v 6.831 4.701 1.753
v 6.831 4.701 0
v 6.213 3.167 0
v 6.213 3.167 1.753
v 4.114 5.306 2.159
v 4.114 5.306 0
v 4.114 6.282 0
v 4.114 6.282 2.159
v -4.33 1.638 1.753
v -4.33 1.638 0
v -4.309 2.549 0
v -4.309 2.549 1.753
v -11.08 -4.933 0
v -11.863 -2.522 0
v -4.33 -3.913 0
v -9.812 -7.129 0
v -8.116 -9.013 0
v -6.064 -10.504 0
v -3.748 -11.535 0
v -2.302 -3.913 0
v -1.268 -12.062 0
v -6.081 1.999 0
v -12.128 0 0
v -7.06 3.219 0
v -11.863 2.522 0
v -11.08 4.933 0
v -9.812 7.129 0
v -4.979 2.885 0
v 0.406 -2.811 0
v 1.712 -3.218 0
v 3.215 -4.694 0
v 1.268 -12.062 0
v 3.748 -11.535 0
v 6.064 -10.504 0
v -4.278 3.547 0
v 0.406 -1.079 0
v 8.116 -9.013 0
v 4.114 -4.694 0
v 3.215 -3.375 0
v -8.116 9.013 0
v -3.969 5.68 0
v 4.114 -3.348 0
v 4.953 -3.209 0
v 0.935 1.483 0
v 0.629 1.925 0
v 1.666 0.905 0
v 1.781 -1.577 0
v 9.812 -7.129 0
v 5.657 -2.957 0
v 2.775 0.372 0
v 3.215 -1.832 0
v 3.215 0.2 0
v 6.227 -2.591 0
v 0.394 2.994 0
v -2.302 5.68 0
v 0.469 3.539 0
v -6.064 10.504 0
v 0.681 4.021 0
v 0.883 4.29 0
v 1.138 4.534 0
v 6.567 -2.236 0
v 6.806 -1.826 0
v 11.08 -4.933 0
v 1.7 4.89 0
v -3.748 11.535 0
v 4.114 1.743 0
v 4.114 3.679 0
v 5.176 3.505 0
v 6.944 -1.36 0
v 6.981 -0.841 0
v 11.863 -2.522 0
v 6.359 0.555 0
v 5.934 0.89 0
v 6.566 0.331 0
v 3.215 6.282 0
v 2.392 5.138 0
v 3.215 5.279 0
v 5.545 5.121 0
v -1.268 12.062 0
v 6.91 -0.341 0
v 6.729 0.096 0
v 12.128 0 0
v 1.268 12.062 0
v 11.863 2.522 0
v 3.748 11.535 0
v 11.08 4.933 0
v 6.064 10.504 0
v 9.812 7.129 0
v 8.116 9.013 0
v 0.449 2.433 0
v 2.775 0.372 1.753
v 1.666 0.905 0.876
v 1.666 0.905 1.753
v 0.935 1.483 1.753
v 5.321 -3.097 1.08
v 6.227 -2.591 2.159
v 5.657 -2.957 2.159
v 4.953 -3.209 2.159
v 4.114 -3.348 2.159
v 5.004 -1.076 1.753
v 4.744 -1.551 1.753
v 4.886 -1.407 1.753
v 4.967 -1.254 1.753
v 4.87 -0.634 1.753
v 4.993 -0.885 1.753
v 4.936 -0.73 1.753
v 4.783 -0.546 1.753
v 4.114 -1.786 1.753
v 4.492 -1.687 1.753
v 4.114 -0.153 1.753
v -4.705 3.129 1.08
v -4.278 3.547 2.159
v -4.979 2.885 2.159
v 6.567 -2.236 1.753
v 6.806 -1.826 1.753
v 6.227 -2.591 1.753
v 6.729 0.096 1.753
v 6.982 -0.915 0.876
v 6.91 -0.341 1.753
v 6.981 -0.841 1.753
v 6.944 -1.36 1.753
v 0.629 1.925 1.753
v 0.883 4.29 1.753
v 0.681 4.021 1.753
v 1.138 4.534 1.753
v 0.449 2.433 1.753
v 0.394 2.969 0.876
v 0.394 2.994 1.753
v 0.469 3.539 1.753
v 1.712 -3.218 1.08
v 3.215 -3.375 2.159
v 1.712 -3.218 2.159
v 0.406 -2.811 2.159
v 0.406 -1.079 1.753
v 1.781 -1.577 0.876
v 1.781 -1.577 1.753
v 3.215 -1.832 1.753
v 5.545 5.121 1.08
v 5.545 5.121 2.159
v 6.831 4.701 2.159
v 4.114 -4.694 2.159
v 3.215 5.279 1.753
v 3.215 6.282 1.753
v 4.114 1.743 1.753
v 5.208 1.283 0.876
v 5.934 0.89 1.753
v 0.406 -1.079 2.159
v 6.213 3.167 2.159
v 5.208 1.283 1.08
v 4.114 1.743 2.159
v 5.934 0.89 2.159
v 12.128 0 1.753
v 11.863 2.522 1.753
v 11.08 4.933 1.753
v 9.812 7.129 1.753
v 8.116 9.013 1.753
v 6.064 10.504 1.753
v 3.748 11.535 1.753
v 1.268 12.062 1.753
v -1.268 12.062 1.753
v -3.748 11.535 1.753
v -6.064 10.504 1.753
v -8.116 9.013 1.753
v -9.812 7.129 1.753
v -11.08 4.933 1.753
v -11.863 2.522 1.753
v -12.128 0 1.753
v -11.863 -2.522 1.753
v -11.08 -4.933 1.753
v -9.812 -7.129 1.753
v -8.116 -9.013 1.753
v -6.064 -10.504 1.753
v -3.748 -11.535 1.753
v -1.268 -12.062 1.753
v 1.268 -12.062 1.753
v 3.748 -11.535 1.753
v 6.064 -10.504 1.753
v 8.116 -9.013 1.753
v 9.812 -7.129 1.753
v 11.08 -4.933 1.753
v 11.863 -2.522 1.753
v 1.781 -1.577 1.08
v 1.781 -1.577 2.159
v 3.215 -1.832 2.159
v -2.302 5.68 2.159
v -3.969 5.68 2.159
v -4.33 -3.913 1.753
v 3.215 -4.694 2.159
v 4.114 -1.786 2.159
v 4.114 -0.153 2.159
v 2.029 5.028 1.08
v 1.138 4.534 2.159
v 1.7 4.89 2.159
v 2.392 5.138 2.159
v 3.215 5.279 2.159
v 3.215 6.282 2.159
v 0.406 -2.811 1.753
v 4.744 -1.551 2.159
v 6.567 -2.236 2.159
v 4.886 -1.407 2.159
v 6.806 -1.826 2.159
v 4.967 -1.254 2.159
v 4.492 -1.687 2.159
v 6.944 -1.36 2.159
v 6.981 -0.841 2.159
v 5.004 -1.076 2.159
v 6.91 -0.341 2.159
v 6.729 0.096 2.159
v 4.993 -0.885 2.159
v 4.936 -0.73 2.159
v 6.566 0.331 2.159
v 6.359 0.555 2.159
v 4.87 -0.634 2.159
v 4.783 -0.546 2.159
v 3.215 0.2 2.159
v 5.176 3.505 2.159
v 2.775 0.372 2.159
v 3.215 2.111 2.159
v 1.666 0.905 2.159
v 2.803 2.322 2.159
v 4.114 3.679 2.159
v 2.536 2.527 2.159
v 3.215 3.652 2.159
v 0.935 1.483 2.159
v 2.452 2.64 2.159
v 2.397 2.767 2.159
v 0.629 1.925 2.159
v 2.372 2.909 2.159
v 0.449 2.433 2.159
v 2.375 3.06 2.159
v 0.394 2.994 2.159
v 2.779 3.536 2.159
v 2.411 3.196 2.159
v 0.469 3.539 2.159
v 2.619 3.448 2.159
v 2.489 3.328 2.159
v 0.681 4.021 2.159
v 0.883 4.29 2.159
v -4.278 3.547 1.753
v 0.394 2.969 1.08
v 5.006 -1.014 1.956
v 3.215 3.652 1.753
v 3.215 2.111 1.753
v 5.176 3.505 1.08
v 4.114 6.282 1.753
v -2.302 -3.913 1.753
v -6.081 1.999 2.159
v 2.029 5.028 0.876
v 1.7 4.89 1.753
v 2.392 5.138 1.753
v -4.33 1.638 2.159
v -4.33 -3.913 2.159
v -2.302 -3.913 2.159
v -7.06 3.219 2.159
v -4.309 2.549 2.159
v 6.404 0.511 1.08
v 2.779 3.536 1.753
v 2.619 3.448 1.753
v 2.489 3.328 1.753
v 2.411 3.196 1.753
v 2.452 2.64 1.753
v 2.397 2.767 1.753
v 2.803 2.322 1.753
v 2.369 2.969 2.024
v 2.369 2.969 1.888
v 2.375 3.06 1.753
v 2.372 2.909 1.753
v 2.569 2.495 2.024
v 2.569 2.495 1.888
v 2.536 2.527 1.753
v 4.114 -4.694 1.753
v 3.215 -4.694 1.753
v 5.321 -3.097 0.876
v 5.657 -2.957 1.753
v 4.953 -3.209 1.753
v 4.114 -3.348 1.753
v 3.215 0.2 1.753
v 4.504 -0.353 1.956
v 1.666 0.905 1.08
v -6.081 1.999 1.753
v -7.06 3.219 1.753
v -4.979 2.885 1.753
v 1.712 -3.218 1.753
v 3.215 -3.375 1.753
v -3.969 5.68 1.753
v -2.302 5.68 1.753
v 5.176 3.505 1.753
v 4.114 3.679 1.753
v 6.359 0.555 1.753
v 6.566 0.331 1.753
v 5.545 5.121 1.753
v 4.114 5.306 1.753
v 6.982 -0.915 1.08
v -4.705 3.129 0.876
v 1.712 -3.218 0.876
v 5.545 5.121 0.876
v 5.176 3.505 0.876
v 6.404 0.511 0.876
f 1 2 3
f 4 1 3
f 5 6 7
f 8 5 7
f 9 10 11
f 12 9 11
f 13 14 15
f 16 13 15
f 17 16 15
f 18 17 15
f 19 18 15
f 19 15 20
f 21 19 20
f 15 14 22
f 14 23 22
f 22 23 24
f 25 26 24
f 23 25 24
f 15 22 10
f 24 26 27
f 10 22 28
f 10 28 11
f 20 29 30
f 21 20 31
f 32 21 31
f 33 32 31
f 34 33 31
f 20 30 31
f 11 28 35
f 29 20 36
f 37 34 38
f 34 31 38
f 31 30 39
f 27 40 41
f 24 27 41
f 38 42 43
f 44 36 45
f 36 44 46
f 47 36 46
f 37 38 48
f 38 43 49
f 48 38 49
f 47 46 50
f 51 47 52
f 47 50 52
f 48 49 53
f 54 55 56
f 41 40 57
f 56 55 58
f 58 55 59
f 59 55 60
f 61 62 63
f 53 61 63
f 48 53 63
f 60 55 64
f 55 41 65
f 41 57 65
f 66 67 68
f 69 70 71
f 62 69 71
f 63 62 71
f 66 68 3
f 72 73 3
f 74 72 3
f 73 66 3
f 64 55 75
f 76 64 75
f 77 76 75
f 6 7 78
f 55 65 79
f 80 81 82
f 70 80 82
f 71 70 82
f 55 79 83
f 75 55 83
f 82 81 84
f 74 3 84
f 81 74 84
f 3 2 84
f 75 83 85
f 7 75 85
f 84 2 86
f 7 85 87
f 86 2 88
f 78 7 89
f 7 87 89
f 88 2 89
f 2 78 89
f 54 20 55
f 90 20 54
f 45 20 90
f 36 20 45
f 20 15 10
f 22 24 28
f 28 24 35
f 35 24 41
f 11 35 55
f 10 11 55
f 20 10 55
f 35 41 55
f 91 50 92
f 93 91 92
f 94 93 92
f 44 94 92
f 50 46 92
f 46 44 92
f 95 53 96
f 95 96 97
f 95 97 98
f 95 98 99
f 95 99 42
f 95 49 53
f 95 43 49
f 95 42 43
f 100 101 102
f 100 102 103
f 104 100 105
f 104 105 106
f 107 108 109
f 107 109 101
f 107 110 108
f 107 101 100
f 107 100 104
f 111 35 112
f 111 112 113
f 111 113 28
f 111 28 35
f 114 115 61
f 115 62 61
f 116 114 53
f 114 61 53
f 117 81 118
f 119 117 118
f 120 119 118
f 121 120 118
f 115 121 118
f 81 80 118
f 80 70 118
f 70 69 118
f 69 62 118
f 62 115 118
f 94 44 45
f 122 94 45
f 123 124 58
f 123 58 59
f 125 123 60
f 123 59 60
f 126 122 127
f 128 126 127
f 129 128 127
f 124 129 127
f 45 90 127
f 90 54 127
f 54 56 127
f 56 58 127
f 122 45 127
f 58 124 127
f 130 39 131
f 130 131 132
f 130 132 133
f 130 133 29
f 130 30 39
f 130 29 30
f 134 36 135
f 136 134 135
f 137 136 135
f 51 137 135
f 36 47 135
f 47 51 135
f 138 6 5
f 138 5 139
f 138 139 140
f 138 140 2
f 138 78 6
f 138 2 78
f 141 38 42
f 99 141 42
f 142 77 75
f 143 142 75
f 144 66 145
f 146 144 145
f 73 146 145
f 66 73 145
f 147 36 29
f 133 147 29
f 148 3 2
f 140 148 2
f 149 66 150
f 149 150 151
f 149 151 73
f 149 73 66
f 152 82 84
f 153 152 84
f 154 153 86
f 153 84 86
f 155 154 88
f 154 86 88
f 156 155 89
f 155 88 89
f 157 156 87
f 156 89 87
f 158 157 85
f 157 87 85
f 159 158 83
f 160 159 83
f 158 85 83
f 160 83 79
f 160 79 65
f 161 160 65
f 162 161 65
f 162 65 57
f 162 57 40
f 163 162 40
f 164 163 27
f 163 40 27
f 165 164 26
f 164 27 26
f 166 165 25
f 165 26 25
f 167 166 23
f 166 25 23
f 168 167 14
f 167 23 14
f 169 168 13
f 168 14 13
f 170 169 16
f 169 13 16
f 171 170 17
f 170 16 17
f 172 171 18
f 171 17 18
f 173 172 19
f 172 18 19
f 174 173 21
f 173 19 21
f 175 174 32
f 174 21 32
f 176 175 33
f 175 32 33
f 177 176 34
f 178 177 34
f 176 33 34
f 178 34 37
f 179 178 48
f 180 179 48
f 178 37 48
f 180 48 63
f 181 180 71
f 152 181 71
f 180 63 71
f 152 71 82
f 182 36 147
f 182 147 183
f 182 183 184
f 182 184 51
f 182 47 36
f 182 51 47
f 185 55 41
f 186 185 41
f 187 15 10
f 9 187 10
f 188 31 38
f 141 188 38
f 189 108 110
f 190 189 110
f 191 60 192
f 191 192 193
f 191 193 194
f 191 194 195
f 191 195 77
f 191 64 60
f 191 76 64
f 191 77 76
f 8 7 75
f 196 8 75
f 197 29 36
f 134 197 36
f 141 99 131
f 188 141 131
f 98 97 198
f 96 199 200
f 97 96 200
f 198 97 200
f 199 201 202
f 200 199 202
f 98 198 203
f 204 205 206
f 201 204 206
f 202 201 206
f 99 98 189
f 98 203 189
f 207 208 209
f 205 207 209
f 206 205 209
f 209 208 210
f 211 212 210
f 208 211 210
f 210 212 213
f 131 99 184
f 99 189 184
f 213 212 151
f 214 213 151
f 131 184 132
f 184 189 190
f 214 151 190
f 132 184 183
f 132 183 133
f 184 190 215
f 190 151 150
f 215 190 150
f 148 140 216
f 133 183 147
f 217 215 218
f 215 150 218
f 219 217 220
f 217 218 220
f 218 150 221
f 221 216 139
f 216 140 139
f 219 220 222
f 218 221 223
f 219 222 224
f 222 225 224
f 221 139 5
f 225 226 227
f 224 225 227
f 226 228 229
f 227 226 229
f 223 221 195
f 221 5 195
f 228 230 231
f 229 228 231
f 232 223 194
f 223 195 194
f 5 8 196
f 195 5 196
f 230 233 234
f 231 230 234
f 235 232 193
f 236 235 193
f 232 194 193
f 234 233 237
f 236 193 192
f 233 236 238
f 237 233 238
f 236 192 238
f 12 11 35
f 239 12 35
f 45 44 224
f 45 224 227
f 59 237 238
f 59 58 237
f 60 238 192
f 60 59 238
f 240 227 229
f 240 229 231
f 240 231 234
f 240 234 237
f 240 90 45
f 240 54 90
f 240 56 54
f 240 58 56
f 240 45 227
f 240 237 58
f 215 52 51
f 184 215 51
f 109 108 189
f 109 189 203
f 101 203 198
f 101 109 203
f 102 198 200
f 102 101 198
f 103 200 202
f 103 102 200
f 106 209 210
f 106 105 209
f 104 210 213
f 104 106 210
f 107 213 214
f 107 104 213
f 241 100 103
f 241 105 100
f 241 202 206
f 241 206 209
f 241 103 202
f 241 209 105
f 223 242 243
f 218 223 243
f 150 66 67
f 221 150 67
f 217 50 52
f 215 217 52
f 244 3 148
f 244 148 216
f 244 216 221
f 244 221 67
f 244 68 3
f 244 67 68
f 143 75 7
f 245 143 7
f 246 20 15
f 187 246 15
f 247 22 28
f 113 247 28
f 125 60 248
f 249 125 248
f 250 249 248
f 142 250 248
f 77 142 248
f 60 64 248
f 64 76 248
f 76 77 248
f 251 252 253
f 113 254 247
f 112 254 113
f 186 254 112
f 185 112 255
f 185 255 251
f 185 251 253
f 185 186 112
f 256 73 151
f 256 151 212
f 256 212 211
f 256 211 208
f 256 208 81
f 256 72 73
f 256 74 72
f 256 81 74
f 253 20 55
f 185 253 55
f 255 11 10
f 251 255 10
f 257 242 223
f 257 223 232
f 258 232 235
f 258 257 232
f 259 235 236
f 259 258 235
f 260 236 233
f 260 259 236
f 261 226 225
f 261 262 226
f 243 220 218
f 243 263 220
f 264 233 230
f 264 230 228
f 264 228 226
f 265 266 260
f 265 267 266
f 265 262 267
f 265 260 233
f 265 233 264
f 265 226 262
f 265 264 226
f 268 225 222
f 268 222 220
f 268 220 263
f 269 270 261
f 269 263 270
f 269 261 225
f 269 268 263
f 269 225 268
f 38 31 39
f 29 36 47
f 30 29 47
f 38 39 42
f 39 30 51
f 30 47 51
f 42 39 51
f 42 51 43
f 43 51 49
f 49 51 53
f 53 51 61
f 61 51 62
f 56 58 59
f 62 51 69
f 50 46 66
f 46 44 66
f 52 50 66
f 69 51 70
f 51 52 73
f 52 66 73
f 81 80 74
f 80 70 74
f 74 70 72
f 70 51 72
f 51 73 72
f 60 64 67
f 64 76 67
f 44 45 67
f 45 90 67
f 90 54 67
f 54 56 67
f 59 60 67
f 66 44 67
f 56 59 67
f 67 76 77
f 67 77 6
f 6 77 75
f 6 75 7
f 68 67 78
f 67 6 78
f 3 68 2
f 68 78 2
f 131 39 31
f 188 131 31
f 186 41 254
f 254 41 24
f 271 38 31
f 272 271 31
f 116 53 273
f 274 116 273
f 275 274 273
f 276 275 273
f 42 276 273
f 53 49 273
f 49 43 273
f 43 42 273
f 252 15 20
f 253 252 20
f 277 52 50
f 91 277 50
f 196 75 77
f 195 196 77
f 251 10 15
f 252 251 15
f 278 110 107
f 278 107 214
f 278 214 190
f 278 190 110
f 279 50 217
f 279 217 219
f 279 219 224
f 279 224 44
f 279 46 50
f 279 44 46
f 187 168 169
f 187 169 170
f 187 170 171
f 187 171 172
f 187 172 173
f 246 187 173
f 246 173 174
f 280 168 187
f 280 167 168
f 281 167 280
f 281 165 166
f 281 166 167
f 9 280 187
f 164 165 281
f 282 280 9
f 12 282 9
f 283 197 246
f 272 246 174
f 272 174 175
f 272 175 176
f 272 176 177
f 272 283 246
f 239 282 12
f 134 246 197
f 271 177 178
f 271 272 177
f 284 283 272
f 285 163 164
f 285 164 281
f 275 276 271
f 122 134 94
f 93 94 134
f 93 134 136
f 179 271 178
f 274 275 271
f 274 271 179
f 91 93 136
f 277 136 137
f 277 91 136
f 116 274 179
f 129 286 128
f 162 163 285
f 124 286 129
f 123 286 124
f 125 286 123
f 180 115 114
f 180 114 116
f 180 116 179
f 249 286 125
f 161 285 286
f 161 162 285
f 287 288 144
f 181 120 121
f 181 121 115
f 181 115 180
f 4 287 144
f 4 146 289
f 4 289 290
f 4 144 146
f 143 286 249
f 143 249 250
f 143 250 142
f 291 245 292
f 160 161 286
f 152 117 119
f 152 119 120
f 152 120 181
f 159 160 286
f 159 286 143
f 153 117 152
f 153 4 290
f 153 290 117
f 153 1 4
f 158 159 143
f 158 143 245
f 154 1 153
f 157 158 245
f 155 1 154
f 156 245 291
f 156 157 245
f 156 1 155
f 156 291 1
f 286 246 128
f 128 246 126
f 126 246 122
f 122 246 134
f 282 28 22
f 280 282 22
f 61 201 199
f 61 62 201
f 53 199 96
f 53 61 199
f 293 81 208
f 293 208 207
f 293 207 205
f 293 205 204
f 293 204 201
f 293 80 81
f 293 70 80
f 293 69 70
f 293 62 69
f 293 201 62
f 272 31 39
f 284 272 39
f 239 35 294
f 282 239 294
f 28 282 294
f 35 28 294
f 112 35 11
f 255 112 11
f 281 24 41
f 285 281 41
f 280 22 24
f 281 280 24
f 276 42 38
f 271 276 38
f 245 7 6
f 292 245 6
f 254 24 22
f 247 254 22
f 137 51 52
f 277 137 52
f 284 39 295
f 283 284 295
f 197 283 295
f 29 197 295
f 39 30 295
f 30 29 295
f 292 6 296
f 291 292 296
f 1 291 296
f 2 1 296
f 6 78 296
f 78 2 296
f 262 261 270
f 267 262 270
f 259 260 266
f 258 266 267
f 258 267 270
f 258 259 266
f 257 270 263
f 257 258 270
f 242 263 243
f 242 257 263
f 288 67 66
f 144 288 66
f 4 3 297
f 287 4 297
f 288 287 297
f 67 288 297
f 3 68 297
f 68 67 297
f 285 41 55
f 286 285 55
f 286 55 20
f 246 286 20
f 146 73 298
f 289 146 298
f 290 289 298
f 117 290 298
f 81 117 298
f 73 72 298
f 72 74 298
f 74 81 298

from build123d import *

# Parameters (mm, degrees)
F1_DEPTH = 2.159
F2_DEPTH = 2.159
F3_DEPTH = 1.7526
F4_DEPTH = 1.7526
F0_R     = 12.1285
F5_DEPTH = 1.7526


with BuildPart() as f1:
    # F0 (on Top) → F1 (new body)
    with BuildSketch(Plane.XY):
        with BuildLine():
            Line((-4.3302370993, -3.9129708894), (-2.3021115051, -3.9129708894))
            Line((-2.3021115051, -3.9129708894), (-2.3021115051, 5.6796852593))
            Line((-2.3021115051, 5.6796852593), (-3.969121569, 5.6796852593))
            Line((-3.969121569, 5.6796852593), (-7.0595986649, 3.2190608324))
            Line((-7.0595986649, 3.2190608324), (-6.081227519, 1.9992461635))
            Line((-6.081227519, 1.9992461635), (-4.9789853483, 2.8852389179))
            add(Edge.make_bspline(
                [(-4.2777493768, 3.5465842203), (-4.781631512, 3.0427020851), (-4.9789853483, 2.8852389179)],
                knots=[0, 0, 0, 1, 1, 1], degree=2))
            Line((-4.2777493768, 3.5465842203), (-4.3092420103, 2.5493174944))
            Line((-4.3092420103, 2.5493174944), (-4.3302370993, 1.6381306333))
            Line((-4.3302370993, 1.6381306333), (-4.3302370993, -3.9129708894))
        make_face()
    extrude(amount=F1_DEPTH)


with BuildPart() as f2:
    # F0 (on Top) → F2 (new body)
    with BuildSketch(Plane.XY):
        with BuildLine():
            add(Edge.make_bspline(
                [(6.9819168357, -0.914872185), (6.9819168357, -1.9583281066), (6.2271433874, -2.5913300389)],
                knots=[0, 0, 0, 1, 1, 1], degree=2))
            add(Edge.make_bspline(
                [(6.7289260136, 0.0960413487), (6.9819168357, -0.3375072384), (6.9819168357, -0.914872185)],
                knots=[0, 0, 0, 1, 1, 1], degree=2))
            add(Edge.make_bspline(
                [(5.9342618963, 0.8896557116), (6.4759351916, 0.5295899359), (6.7289260136, 0.0960413487)],
                knots=[0, 0, 0, 1, 1, 1], degree=2))
            add(Edge.make_bspline(
                [(4.1139876829, 1.7431060781), (5.3925886009, 1.2497214874), (5.9342618963, 0.8896557116)],
                knots=[0, 0, 0, 1, 1, 1], degree=2))
            Line((4.1139876829, 1.7431060781), (4.1139876829, 3.6788532808))
            add(Edge.make_bspline(
                [(6.2134965795, 3.16657311), (5.188936238, 3.5864748893), (4.1139876829, 3.6788532808)],
                knots=[0, 0, 0, 1, 1, 1], degree=2))
            Line((6.2134965795, 3.16657311), (6.8307521951, 4.7013141134))
            add(Edge.make_bspline(
                [(4.1139876829, 5.3059726757), (5.6172360529, 5.238788391), (6.8307521951, 4.7013141134)],
                knots=[0, 0, 0, 1, 1, 1], degree=2))
            Line((4.1139876829, 5.3059726757), (4.1139876829, 6.2822443126))
            Line((4.1139876829, 6.2822443126), (3.2153978752, 6.2822443126))
            Line((3.2153978752, 6.2822443126), (3.2153978752, 5.27867906))
            add(Edge.make_bspline(
                [(1.137933822, 4.5344031562), (1.8822097258, 5.1485095084), (3.2153978752, 5.27867906)],
                knots=[0, 0, 0, 1, 1, 1], degree=2))
            add(Edge.make_bspline(
                [(0.3936579181, 2.9692192737), (0.3936579181, 3.9202968039), (1.137933822, 4.5344031562)],
                knots=[0, 0, 0, 1, 1, 1], degree=2))
            add(Edge.make_bspline(
                [(0.9353312134, 1.4827669749), (0.3936579181, 2.0832265194), (0.3936579181, 2.9692192737)],
                knots=[0, 0, 0, 1, 1, 1], degree=2))
            add(Edge.make_bspline(
                [(2.7745010069, 0.3721267686), (1.4770045088, 0.8823074305), (0.9353312134, 1.4827669749)],
                knots=[0, 0, 0, 1, 1, 1], degree=2))
            Line((2.7745010069, 0.3721267686), (3.2153978752, 0.1999670391))
            Line((3.2153978752, 0.1999670391), (3.2153978752, -1.8323575728))
            add(Edge.make_bspline(
                [(1.7814332988, -1.5772672419), (2.5855452062, -1.7945664127), (3.2153978752, -1.8323575728)],
                knots=[0, 0, 0, 1, 1, 1], degree=2))
            add(Edge.make_bspline(
                [(0.4062549715, -1.0786338789), (0.9773213914, -1.3599680711), (1.7814332988, -1.5772672419)],
                knots=[0, 0, 0, 1, 1, 1], degree=2))
            Line((0.4062549715, -1.0786338789), (0.4062549715, -2.8107287186))
            add(Edge.make_bspline(
                [(3.2153978752, -3.3754966118), (1.613472587, -3.3419044695), (0.4062549715, -2.8107287186)],
                knots=[0, 0, 0, 1, 1, 1], degree=2))
            Line((3.2153978752, -3.3754966118), (3.2153978752, -4.6939881989))
            Line((3.2153978752, -4.6939881989), (4.1139876829, -4.6939881989))
            Line((4.1139876829, -4.6939881989), (4.1139876829, -3.3482029962))
            add(Edge.make_bspline(
                [(6.2271433874, -2.5913300389), (5.472369939, -3.2243319713), (4.1139876829, -3.3482029962)],
                knots=[0, 0, 0, 1, 1, 1], degree=2))
        make_face()
        with BuildLine():
            add(Edge.make_bspline(
                [(5.006278964, -1.0135491031), (5.006278964, -0.7364139288), (4.7826812665, -0.5464083736)],
                knots=[0, 0, 0, 1, 1, 1], degree=2))
            add(Edge.make_bspline(
                [(4.1139876829, -1.7861683771), (5.006278964, -1.6371032454), (5.006278964, -1.0135491031)],
                knots=[0, 0, 0, 1, 1, 1], degree=2))
            Line((4.1139876829, -1.7861683771), (4.1139876829, -0.1527504555))
            add(Edge.make_bspline(
                [(4.7826812665, -0.5464083736), (4.559083569, -0.3564028185), (4.1139876829, -0.1527504555)],
                knots=[0, 0, 0, 1, 1, 1], degree=2))
        make_face(mode=Mode.SUBTRACT)
        with BuildLine():
            add(Edge.make_bspline(
                [(2.3692957898, 2.9692192737), (2.3692957898, 2.6815865549), (2.568749135, 2.4947302631)],
                knots=[0, 0, 0, 1, 1, 1], degree=2))
            add(Edge.make_bspline(
                [(3.2153978752, 3.6515596651), (2.3692957898, 3.5276886402), (2.3692957898, 2.9692192737)],
                knots=[0, 0, 0, 1, 1, 1], degree=2))
            Line((3.2153978752, 3.6515596651), (3.2153978752, 2.110520135))
            add(Edge.make_bspline(
                [(2.568749135, 2.4947302631), (2.7682024802, 2.3078739713), (3.2153978752, 2.110520135)],
                knots=[0, 0, 0, 1, 1, 1], degree=2))
        make_face(mode=Mode.SUBTRACT)
    extrude(amount=F2_DEPTH)

    # F0 (on Top) → F3 (join)
    with BuildSketch(Plane.XY):
        with BuildLine():
            add(Edge.make_bspline(
                [(3.2153978752, 3.6515596651), (2.3692957898, 3.5276886402), (2.3692957898, 2.9692192737)],
                knots=[0, 0, 0, 1, 1, 1], degree=2))
            add(Edge.make_bspline(
                [(2.3692957898, 2.9692192737), (2.3692957898, 2.6815865549), (2.568749135, 2.4947302631)],
                knots=[0, 0, 0, 1, 1, 1], degree=2))
            add(Edge.make_bspline(
                [(2.568749135, 2.4947302631), (2.7682024802, 2.3078739713), (3.2153978752, 2.110520135)],
                knots=[0, 0, 0, 1, 1, 1], degree=2))
            Line((3.2153978752, 2.110520135), (3.2153978752, 3.6515596651))
        make_face()
    extrude(amount=F3_DEPTH)

    # F0 (on Top) → F4 (join)
    with BuildSketch(Plane.XY):
        with BuildLine():
            add(Edge.make_bspline(
                [(4.1139876829, -1.7861683771), (5.006278964, -1.6371032454), (5.006278964, -1.0135491031)],
                knots=[0, 0, 0, 1, 1, 1], degree=2))
            add(Edge.make_bspline(
                [(5.006278964, -1.0135491031), (5.006278964, -0.7364139288), (4.7826812665, -0.5464083736)],
                knots=[0, 0, 0, 1, 1, 1], degree=2))
            add(Edge.make_bspline(
                [(4.7826812665, -0.5464083736), (4.559083569, -0.3564028185), (4.1139876829, -0.1527504555)],
                knots=[0, 0, 0, 1, 1, 1], degree=2))
            Line((4.1139876829, -0.1527504555), (4.1139876829, -1.7861683771))
        make_face()
    extrude(amount=F4_DEPTH)


with BuildPart() as f5:
    # F0 (on Top) → F5 (new body)
    with BuildSketch(Plane.XY):
        Circle(F0_R)
        with BuildLine():
            Line((-2.3021115051, 5.6796852593), (-2.3021115051, -3.9129708894))
            Line((-2.3021115051, -3.9129708894), (-4.3302370993, -3.9129708894))
            Line((-4.3302370993, -3.9129708894), (-4.3302370993, 1.6381306333))
            Line((-4.3302370993, 1.6381306333), (-4.3092420103, 2.5493174944))
            Line((-4.3092420103, 2.5493174944), (-4.2777493768, 3.5465842203))
            add(Edge.make_bspline(
                [(-4.2777493768, 3.5465842203), (-4.781631512, 3.0427020851), (-4.9789853483, 2.8852389179)],
                knots=[0, 0, 0, 1, 1, 1], degree=2))
            Line((-4.9789853483, 2.8852389179), (-6.081227519, 1.9992461635))
            Line((-6.081227519, 1.9992461635), (-7.0595986649, 3.2190608324))
            Line((-7.0595986649, 3.2190608324), (-3.969121569, 5.6796852593))
            Line((-3.969121569, 5.6796852593), (-2.3021115051, 5.6796852593))
        make_face(mode=Mode.SUBTRACT)
        with BuildLine():
            add(Edge.make_bspline(
                [(6.7289260136, 0.0960413487), (6.9819168357, -0.3375072384), (6.9819168357, -0.914872185)],
                knots=[0, 0, 0, 1, 1, 1], degree=2))
            add(Edge.make_bspline(
                [(6.9819168357, -0.914872185), (6.9819168357, -1.9583281066), (6.2271433874, -2.5913300389)],
                knots=[0, 0, 0, 1, 1, 1], degree=2))
            add(Edge.make_bspline(
                [(6.2271433874, -2.5913300389), (5.472369939, -3.2243319713), (4.1139876829, -3.3482029962)],
                knots=[0, 0, 0, 1, 1, 1], degree=2))
            Line((4.1139876829, -3.3482029962), (4.1139876829, -4.6939881989))
            Line((4.1139876829, -4.6939881989), (3.2153978752, -4.6939881989))
            Line((3.2153978752, -4.6939881989), (3.2153978752, -3.3754966118))
            add(Edge.make_bspline(
                [(3.2153978752, -3.3754966118), (1.613472587, -3.3419044695), (0.4062549715, -2.8107287186)],
                knots=[0, 0, 0, 1, 1, 1], degree=2))
            Line((0.4062549715, -2.8107287186), (0.4062549715, -1.0786338789))
            add(Edge.make_bspline(
                [(0.4062549715, -1.0786338789), (0.9773213914, -1.3599680711), (1.7814332988, -1.5772672419)],
                knots=[0, 0, 0, 1, 1, 1], degree=2))
            add(Edge.make_bspline(
                [(1.7814332988, -1.5772672419), (2.5855452062, -1.7945664127), (3.2153978752, -1.8323575728)],
                knots=[0, 0, 0, 1, 1, 1], degree=2))
            Line((3.2153978752, -1.8323575728), (3.2153978752, 0.1999670391))
            Line((3.2153978752, 0.1999670391), (2.7745010069, 0.3721267686))
            add(Edge.make_bspline(
                [(2.7745010069, 0.3721267686), (1.4770045088, 0.8823074305), (0.9353312134, 1.4827669749)],
                knots=[0, 0, 0, 1, 1, 1], degree=2))
            add(Edge.make_bspline(
                [(0.9353312134, 1.4827669749), (0.3936579181, 2.0832265194), (0.3936579181, 2.9692192737)],
                knots=[0, 0, 0, 1, 1, 1], degree=2))
            add(Edge.make_bspline(
                [(0.3936579181, 2.9692192737), (0.3936579181, 3.9202968039), (1.137933822, 4.5344031562)],
                knots=[0, 0, 0, 1, 1, 1], degree=2))
            add(Edge.make_bspline(
                [(1.137933822, 4.5344031562), (1.8822097258, 5.1485095084), (3.2153978752, 5.27867906)],
                knots=[0, 0, 0, 1, 1, 1], degree=2))
            Line((3.2153978752, 5.27867906), (3.2153978752, 6.2822443126))
            Line((3.2153978752, 6.2822443126), (4.1139876829, 6.2822443126))
            Line((4.1139876829, 6.2822443126), (4.1139876829, 5.3059726757))
            add(Edge.make_bspline(
                [(4.1139876829, 5.3059726757), (5.6172360529, 5.238788391), (6.8307521951, 4.7013141134)],
                knots=[0, 0, 0, 1, 1, 1], degree=2))
            Line((6.8307521951, 4.7013141134), (6.2134965795, 3.16657311))
            add(Edge.make_bspline(
                [(6.2134965795, 3.16657311), (5.188936238, 3.5864748893), (4.1139876829, 3.6788532808)],
                knots=[0, 0, 0, 1, 1, 1], degree=2))
            Line((4.1139876829, 3.6788532808), (4.1139876829, 1.7431060781))
            add(Edge.make_bspline(
                [(4.1139876829, 1.7431060781), (5.3925886009, 1.2497214874), (5.9342618963, 0.8896557116)],
                knots=[0, 0, 0, 1, 1, 1], degree=2))
            add(Edge.make_bspline(
                [(5.9342618963, 0.8896557116), (6.4759351916, 0.5295899359), (6.7289260136, 0.0960413487)],
                knots=[0, 0, 0, 1, 1, 1], degree=2))
        make_face(mode=Mode.SUBTRACT)
    extrude(amount=F5_DEPTH)


solid = Compound([f1.part, f2.part, f5.part])
